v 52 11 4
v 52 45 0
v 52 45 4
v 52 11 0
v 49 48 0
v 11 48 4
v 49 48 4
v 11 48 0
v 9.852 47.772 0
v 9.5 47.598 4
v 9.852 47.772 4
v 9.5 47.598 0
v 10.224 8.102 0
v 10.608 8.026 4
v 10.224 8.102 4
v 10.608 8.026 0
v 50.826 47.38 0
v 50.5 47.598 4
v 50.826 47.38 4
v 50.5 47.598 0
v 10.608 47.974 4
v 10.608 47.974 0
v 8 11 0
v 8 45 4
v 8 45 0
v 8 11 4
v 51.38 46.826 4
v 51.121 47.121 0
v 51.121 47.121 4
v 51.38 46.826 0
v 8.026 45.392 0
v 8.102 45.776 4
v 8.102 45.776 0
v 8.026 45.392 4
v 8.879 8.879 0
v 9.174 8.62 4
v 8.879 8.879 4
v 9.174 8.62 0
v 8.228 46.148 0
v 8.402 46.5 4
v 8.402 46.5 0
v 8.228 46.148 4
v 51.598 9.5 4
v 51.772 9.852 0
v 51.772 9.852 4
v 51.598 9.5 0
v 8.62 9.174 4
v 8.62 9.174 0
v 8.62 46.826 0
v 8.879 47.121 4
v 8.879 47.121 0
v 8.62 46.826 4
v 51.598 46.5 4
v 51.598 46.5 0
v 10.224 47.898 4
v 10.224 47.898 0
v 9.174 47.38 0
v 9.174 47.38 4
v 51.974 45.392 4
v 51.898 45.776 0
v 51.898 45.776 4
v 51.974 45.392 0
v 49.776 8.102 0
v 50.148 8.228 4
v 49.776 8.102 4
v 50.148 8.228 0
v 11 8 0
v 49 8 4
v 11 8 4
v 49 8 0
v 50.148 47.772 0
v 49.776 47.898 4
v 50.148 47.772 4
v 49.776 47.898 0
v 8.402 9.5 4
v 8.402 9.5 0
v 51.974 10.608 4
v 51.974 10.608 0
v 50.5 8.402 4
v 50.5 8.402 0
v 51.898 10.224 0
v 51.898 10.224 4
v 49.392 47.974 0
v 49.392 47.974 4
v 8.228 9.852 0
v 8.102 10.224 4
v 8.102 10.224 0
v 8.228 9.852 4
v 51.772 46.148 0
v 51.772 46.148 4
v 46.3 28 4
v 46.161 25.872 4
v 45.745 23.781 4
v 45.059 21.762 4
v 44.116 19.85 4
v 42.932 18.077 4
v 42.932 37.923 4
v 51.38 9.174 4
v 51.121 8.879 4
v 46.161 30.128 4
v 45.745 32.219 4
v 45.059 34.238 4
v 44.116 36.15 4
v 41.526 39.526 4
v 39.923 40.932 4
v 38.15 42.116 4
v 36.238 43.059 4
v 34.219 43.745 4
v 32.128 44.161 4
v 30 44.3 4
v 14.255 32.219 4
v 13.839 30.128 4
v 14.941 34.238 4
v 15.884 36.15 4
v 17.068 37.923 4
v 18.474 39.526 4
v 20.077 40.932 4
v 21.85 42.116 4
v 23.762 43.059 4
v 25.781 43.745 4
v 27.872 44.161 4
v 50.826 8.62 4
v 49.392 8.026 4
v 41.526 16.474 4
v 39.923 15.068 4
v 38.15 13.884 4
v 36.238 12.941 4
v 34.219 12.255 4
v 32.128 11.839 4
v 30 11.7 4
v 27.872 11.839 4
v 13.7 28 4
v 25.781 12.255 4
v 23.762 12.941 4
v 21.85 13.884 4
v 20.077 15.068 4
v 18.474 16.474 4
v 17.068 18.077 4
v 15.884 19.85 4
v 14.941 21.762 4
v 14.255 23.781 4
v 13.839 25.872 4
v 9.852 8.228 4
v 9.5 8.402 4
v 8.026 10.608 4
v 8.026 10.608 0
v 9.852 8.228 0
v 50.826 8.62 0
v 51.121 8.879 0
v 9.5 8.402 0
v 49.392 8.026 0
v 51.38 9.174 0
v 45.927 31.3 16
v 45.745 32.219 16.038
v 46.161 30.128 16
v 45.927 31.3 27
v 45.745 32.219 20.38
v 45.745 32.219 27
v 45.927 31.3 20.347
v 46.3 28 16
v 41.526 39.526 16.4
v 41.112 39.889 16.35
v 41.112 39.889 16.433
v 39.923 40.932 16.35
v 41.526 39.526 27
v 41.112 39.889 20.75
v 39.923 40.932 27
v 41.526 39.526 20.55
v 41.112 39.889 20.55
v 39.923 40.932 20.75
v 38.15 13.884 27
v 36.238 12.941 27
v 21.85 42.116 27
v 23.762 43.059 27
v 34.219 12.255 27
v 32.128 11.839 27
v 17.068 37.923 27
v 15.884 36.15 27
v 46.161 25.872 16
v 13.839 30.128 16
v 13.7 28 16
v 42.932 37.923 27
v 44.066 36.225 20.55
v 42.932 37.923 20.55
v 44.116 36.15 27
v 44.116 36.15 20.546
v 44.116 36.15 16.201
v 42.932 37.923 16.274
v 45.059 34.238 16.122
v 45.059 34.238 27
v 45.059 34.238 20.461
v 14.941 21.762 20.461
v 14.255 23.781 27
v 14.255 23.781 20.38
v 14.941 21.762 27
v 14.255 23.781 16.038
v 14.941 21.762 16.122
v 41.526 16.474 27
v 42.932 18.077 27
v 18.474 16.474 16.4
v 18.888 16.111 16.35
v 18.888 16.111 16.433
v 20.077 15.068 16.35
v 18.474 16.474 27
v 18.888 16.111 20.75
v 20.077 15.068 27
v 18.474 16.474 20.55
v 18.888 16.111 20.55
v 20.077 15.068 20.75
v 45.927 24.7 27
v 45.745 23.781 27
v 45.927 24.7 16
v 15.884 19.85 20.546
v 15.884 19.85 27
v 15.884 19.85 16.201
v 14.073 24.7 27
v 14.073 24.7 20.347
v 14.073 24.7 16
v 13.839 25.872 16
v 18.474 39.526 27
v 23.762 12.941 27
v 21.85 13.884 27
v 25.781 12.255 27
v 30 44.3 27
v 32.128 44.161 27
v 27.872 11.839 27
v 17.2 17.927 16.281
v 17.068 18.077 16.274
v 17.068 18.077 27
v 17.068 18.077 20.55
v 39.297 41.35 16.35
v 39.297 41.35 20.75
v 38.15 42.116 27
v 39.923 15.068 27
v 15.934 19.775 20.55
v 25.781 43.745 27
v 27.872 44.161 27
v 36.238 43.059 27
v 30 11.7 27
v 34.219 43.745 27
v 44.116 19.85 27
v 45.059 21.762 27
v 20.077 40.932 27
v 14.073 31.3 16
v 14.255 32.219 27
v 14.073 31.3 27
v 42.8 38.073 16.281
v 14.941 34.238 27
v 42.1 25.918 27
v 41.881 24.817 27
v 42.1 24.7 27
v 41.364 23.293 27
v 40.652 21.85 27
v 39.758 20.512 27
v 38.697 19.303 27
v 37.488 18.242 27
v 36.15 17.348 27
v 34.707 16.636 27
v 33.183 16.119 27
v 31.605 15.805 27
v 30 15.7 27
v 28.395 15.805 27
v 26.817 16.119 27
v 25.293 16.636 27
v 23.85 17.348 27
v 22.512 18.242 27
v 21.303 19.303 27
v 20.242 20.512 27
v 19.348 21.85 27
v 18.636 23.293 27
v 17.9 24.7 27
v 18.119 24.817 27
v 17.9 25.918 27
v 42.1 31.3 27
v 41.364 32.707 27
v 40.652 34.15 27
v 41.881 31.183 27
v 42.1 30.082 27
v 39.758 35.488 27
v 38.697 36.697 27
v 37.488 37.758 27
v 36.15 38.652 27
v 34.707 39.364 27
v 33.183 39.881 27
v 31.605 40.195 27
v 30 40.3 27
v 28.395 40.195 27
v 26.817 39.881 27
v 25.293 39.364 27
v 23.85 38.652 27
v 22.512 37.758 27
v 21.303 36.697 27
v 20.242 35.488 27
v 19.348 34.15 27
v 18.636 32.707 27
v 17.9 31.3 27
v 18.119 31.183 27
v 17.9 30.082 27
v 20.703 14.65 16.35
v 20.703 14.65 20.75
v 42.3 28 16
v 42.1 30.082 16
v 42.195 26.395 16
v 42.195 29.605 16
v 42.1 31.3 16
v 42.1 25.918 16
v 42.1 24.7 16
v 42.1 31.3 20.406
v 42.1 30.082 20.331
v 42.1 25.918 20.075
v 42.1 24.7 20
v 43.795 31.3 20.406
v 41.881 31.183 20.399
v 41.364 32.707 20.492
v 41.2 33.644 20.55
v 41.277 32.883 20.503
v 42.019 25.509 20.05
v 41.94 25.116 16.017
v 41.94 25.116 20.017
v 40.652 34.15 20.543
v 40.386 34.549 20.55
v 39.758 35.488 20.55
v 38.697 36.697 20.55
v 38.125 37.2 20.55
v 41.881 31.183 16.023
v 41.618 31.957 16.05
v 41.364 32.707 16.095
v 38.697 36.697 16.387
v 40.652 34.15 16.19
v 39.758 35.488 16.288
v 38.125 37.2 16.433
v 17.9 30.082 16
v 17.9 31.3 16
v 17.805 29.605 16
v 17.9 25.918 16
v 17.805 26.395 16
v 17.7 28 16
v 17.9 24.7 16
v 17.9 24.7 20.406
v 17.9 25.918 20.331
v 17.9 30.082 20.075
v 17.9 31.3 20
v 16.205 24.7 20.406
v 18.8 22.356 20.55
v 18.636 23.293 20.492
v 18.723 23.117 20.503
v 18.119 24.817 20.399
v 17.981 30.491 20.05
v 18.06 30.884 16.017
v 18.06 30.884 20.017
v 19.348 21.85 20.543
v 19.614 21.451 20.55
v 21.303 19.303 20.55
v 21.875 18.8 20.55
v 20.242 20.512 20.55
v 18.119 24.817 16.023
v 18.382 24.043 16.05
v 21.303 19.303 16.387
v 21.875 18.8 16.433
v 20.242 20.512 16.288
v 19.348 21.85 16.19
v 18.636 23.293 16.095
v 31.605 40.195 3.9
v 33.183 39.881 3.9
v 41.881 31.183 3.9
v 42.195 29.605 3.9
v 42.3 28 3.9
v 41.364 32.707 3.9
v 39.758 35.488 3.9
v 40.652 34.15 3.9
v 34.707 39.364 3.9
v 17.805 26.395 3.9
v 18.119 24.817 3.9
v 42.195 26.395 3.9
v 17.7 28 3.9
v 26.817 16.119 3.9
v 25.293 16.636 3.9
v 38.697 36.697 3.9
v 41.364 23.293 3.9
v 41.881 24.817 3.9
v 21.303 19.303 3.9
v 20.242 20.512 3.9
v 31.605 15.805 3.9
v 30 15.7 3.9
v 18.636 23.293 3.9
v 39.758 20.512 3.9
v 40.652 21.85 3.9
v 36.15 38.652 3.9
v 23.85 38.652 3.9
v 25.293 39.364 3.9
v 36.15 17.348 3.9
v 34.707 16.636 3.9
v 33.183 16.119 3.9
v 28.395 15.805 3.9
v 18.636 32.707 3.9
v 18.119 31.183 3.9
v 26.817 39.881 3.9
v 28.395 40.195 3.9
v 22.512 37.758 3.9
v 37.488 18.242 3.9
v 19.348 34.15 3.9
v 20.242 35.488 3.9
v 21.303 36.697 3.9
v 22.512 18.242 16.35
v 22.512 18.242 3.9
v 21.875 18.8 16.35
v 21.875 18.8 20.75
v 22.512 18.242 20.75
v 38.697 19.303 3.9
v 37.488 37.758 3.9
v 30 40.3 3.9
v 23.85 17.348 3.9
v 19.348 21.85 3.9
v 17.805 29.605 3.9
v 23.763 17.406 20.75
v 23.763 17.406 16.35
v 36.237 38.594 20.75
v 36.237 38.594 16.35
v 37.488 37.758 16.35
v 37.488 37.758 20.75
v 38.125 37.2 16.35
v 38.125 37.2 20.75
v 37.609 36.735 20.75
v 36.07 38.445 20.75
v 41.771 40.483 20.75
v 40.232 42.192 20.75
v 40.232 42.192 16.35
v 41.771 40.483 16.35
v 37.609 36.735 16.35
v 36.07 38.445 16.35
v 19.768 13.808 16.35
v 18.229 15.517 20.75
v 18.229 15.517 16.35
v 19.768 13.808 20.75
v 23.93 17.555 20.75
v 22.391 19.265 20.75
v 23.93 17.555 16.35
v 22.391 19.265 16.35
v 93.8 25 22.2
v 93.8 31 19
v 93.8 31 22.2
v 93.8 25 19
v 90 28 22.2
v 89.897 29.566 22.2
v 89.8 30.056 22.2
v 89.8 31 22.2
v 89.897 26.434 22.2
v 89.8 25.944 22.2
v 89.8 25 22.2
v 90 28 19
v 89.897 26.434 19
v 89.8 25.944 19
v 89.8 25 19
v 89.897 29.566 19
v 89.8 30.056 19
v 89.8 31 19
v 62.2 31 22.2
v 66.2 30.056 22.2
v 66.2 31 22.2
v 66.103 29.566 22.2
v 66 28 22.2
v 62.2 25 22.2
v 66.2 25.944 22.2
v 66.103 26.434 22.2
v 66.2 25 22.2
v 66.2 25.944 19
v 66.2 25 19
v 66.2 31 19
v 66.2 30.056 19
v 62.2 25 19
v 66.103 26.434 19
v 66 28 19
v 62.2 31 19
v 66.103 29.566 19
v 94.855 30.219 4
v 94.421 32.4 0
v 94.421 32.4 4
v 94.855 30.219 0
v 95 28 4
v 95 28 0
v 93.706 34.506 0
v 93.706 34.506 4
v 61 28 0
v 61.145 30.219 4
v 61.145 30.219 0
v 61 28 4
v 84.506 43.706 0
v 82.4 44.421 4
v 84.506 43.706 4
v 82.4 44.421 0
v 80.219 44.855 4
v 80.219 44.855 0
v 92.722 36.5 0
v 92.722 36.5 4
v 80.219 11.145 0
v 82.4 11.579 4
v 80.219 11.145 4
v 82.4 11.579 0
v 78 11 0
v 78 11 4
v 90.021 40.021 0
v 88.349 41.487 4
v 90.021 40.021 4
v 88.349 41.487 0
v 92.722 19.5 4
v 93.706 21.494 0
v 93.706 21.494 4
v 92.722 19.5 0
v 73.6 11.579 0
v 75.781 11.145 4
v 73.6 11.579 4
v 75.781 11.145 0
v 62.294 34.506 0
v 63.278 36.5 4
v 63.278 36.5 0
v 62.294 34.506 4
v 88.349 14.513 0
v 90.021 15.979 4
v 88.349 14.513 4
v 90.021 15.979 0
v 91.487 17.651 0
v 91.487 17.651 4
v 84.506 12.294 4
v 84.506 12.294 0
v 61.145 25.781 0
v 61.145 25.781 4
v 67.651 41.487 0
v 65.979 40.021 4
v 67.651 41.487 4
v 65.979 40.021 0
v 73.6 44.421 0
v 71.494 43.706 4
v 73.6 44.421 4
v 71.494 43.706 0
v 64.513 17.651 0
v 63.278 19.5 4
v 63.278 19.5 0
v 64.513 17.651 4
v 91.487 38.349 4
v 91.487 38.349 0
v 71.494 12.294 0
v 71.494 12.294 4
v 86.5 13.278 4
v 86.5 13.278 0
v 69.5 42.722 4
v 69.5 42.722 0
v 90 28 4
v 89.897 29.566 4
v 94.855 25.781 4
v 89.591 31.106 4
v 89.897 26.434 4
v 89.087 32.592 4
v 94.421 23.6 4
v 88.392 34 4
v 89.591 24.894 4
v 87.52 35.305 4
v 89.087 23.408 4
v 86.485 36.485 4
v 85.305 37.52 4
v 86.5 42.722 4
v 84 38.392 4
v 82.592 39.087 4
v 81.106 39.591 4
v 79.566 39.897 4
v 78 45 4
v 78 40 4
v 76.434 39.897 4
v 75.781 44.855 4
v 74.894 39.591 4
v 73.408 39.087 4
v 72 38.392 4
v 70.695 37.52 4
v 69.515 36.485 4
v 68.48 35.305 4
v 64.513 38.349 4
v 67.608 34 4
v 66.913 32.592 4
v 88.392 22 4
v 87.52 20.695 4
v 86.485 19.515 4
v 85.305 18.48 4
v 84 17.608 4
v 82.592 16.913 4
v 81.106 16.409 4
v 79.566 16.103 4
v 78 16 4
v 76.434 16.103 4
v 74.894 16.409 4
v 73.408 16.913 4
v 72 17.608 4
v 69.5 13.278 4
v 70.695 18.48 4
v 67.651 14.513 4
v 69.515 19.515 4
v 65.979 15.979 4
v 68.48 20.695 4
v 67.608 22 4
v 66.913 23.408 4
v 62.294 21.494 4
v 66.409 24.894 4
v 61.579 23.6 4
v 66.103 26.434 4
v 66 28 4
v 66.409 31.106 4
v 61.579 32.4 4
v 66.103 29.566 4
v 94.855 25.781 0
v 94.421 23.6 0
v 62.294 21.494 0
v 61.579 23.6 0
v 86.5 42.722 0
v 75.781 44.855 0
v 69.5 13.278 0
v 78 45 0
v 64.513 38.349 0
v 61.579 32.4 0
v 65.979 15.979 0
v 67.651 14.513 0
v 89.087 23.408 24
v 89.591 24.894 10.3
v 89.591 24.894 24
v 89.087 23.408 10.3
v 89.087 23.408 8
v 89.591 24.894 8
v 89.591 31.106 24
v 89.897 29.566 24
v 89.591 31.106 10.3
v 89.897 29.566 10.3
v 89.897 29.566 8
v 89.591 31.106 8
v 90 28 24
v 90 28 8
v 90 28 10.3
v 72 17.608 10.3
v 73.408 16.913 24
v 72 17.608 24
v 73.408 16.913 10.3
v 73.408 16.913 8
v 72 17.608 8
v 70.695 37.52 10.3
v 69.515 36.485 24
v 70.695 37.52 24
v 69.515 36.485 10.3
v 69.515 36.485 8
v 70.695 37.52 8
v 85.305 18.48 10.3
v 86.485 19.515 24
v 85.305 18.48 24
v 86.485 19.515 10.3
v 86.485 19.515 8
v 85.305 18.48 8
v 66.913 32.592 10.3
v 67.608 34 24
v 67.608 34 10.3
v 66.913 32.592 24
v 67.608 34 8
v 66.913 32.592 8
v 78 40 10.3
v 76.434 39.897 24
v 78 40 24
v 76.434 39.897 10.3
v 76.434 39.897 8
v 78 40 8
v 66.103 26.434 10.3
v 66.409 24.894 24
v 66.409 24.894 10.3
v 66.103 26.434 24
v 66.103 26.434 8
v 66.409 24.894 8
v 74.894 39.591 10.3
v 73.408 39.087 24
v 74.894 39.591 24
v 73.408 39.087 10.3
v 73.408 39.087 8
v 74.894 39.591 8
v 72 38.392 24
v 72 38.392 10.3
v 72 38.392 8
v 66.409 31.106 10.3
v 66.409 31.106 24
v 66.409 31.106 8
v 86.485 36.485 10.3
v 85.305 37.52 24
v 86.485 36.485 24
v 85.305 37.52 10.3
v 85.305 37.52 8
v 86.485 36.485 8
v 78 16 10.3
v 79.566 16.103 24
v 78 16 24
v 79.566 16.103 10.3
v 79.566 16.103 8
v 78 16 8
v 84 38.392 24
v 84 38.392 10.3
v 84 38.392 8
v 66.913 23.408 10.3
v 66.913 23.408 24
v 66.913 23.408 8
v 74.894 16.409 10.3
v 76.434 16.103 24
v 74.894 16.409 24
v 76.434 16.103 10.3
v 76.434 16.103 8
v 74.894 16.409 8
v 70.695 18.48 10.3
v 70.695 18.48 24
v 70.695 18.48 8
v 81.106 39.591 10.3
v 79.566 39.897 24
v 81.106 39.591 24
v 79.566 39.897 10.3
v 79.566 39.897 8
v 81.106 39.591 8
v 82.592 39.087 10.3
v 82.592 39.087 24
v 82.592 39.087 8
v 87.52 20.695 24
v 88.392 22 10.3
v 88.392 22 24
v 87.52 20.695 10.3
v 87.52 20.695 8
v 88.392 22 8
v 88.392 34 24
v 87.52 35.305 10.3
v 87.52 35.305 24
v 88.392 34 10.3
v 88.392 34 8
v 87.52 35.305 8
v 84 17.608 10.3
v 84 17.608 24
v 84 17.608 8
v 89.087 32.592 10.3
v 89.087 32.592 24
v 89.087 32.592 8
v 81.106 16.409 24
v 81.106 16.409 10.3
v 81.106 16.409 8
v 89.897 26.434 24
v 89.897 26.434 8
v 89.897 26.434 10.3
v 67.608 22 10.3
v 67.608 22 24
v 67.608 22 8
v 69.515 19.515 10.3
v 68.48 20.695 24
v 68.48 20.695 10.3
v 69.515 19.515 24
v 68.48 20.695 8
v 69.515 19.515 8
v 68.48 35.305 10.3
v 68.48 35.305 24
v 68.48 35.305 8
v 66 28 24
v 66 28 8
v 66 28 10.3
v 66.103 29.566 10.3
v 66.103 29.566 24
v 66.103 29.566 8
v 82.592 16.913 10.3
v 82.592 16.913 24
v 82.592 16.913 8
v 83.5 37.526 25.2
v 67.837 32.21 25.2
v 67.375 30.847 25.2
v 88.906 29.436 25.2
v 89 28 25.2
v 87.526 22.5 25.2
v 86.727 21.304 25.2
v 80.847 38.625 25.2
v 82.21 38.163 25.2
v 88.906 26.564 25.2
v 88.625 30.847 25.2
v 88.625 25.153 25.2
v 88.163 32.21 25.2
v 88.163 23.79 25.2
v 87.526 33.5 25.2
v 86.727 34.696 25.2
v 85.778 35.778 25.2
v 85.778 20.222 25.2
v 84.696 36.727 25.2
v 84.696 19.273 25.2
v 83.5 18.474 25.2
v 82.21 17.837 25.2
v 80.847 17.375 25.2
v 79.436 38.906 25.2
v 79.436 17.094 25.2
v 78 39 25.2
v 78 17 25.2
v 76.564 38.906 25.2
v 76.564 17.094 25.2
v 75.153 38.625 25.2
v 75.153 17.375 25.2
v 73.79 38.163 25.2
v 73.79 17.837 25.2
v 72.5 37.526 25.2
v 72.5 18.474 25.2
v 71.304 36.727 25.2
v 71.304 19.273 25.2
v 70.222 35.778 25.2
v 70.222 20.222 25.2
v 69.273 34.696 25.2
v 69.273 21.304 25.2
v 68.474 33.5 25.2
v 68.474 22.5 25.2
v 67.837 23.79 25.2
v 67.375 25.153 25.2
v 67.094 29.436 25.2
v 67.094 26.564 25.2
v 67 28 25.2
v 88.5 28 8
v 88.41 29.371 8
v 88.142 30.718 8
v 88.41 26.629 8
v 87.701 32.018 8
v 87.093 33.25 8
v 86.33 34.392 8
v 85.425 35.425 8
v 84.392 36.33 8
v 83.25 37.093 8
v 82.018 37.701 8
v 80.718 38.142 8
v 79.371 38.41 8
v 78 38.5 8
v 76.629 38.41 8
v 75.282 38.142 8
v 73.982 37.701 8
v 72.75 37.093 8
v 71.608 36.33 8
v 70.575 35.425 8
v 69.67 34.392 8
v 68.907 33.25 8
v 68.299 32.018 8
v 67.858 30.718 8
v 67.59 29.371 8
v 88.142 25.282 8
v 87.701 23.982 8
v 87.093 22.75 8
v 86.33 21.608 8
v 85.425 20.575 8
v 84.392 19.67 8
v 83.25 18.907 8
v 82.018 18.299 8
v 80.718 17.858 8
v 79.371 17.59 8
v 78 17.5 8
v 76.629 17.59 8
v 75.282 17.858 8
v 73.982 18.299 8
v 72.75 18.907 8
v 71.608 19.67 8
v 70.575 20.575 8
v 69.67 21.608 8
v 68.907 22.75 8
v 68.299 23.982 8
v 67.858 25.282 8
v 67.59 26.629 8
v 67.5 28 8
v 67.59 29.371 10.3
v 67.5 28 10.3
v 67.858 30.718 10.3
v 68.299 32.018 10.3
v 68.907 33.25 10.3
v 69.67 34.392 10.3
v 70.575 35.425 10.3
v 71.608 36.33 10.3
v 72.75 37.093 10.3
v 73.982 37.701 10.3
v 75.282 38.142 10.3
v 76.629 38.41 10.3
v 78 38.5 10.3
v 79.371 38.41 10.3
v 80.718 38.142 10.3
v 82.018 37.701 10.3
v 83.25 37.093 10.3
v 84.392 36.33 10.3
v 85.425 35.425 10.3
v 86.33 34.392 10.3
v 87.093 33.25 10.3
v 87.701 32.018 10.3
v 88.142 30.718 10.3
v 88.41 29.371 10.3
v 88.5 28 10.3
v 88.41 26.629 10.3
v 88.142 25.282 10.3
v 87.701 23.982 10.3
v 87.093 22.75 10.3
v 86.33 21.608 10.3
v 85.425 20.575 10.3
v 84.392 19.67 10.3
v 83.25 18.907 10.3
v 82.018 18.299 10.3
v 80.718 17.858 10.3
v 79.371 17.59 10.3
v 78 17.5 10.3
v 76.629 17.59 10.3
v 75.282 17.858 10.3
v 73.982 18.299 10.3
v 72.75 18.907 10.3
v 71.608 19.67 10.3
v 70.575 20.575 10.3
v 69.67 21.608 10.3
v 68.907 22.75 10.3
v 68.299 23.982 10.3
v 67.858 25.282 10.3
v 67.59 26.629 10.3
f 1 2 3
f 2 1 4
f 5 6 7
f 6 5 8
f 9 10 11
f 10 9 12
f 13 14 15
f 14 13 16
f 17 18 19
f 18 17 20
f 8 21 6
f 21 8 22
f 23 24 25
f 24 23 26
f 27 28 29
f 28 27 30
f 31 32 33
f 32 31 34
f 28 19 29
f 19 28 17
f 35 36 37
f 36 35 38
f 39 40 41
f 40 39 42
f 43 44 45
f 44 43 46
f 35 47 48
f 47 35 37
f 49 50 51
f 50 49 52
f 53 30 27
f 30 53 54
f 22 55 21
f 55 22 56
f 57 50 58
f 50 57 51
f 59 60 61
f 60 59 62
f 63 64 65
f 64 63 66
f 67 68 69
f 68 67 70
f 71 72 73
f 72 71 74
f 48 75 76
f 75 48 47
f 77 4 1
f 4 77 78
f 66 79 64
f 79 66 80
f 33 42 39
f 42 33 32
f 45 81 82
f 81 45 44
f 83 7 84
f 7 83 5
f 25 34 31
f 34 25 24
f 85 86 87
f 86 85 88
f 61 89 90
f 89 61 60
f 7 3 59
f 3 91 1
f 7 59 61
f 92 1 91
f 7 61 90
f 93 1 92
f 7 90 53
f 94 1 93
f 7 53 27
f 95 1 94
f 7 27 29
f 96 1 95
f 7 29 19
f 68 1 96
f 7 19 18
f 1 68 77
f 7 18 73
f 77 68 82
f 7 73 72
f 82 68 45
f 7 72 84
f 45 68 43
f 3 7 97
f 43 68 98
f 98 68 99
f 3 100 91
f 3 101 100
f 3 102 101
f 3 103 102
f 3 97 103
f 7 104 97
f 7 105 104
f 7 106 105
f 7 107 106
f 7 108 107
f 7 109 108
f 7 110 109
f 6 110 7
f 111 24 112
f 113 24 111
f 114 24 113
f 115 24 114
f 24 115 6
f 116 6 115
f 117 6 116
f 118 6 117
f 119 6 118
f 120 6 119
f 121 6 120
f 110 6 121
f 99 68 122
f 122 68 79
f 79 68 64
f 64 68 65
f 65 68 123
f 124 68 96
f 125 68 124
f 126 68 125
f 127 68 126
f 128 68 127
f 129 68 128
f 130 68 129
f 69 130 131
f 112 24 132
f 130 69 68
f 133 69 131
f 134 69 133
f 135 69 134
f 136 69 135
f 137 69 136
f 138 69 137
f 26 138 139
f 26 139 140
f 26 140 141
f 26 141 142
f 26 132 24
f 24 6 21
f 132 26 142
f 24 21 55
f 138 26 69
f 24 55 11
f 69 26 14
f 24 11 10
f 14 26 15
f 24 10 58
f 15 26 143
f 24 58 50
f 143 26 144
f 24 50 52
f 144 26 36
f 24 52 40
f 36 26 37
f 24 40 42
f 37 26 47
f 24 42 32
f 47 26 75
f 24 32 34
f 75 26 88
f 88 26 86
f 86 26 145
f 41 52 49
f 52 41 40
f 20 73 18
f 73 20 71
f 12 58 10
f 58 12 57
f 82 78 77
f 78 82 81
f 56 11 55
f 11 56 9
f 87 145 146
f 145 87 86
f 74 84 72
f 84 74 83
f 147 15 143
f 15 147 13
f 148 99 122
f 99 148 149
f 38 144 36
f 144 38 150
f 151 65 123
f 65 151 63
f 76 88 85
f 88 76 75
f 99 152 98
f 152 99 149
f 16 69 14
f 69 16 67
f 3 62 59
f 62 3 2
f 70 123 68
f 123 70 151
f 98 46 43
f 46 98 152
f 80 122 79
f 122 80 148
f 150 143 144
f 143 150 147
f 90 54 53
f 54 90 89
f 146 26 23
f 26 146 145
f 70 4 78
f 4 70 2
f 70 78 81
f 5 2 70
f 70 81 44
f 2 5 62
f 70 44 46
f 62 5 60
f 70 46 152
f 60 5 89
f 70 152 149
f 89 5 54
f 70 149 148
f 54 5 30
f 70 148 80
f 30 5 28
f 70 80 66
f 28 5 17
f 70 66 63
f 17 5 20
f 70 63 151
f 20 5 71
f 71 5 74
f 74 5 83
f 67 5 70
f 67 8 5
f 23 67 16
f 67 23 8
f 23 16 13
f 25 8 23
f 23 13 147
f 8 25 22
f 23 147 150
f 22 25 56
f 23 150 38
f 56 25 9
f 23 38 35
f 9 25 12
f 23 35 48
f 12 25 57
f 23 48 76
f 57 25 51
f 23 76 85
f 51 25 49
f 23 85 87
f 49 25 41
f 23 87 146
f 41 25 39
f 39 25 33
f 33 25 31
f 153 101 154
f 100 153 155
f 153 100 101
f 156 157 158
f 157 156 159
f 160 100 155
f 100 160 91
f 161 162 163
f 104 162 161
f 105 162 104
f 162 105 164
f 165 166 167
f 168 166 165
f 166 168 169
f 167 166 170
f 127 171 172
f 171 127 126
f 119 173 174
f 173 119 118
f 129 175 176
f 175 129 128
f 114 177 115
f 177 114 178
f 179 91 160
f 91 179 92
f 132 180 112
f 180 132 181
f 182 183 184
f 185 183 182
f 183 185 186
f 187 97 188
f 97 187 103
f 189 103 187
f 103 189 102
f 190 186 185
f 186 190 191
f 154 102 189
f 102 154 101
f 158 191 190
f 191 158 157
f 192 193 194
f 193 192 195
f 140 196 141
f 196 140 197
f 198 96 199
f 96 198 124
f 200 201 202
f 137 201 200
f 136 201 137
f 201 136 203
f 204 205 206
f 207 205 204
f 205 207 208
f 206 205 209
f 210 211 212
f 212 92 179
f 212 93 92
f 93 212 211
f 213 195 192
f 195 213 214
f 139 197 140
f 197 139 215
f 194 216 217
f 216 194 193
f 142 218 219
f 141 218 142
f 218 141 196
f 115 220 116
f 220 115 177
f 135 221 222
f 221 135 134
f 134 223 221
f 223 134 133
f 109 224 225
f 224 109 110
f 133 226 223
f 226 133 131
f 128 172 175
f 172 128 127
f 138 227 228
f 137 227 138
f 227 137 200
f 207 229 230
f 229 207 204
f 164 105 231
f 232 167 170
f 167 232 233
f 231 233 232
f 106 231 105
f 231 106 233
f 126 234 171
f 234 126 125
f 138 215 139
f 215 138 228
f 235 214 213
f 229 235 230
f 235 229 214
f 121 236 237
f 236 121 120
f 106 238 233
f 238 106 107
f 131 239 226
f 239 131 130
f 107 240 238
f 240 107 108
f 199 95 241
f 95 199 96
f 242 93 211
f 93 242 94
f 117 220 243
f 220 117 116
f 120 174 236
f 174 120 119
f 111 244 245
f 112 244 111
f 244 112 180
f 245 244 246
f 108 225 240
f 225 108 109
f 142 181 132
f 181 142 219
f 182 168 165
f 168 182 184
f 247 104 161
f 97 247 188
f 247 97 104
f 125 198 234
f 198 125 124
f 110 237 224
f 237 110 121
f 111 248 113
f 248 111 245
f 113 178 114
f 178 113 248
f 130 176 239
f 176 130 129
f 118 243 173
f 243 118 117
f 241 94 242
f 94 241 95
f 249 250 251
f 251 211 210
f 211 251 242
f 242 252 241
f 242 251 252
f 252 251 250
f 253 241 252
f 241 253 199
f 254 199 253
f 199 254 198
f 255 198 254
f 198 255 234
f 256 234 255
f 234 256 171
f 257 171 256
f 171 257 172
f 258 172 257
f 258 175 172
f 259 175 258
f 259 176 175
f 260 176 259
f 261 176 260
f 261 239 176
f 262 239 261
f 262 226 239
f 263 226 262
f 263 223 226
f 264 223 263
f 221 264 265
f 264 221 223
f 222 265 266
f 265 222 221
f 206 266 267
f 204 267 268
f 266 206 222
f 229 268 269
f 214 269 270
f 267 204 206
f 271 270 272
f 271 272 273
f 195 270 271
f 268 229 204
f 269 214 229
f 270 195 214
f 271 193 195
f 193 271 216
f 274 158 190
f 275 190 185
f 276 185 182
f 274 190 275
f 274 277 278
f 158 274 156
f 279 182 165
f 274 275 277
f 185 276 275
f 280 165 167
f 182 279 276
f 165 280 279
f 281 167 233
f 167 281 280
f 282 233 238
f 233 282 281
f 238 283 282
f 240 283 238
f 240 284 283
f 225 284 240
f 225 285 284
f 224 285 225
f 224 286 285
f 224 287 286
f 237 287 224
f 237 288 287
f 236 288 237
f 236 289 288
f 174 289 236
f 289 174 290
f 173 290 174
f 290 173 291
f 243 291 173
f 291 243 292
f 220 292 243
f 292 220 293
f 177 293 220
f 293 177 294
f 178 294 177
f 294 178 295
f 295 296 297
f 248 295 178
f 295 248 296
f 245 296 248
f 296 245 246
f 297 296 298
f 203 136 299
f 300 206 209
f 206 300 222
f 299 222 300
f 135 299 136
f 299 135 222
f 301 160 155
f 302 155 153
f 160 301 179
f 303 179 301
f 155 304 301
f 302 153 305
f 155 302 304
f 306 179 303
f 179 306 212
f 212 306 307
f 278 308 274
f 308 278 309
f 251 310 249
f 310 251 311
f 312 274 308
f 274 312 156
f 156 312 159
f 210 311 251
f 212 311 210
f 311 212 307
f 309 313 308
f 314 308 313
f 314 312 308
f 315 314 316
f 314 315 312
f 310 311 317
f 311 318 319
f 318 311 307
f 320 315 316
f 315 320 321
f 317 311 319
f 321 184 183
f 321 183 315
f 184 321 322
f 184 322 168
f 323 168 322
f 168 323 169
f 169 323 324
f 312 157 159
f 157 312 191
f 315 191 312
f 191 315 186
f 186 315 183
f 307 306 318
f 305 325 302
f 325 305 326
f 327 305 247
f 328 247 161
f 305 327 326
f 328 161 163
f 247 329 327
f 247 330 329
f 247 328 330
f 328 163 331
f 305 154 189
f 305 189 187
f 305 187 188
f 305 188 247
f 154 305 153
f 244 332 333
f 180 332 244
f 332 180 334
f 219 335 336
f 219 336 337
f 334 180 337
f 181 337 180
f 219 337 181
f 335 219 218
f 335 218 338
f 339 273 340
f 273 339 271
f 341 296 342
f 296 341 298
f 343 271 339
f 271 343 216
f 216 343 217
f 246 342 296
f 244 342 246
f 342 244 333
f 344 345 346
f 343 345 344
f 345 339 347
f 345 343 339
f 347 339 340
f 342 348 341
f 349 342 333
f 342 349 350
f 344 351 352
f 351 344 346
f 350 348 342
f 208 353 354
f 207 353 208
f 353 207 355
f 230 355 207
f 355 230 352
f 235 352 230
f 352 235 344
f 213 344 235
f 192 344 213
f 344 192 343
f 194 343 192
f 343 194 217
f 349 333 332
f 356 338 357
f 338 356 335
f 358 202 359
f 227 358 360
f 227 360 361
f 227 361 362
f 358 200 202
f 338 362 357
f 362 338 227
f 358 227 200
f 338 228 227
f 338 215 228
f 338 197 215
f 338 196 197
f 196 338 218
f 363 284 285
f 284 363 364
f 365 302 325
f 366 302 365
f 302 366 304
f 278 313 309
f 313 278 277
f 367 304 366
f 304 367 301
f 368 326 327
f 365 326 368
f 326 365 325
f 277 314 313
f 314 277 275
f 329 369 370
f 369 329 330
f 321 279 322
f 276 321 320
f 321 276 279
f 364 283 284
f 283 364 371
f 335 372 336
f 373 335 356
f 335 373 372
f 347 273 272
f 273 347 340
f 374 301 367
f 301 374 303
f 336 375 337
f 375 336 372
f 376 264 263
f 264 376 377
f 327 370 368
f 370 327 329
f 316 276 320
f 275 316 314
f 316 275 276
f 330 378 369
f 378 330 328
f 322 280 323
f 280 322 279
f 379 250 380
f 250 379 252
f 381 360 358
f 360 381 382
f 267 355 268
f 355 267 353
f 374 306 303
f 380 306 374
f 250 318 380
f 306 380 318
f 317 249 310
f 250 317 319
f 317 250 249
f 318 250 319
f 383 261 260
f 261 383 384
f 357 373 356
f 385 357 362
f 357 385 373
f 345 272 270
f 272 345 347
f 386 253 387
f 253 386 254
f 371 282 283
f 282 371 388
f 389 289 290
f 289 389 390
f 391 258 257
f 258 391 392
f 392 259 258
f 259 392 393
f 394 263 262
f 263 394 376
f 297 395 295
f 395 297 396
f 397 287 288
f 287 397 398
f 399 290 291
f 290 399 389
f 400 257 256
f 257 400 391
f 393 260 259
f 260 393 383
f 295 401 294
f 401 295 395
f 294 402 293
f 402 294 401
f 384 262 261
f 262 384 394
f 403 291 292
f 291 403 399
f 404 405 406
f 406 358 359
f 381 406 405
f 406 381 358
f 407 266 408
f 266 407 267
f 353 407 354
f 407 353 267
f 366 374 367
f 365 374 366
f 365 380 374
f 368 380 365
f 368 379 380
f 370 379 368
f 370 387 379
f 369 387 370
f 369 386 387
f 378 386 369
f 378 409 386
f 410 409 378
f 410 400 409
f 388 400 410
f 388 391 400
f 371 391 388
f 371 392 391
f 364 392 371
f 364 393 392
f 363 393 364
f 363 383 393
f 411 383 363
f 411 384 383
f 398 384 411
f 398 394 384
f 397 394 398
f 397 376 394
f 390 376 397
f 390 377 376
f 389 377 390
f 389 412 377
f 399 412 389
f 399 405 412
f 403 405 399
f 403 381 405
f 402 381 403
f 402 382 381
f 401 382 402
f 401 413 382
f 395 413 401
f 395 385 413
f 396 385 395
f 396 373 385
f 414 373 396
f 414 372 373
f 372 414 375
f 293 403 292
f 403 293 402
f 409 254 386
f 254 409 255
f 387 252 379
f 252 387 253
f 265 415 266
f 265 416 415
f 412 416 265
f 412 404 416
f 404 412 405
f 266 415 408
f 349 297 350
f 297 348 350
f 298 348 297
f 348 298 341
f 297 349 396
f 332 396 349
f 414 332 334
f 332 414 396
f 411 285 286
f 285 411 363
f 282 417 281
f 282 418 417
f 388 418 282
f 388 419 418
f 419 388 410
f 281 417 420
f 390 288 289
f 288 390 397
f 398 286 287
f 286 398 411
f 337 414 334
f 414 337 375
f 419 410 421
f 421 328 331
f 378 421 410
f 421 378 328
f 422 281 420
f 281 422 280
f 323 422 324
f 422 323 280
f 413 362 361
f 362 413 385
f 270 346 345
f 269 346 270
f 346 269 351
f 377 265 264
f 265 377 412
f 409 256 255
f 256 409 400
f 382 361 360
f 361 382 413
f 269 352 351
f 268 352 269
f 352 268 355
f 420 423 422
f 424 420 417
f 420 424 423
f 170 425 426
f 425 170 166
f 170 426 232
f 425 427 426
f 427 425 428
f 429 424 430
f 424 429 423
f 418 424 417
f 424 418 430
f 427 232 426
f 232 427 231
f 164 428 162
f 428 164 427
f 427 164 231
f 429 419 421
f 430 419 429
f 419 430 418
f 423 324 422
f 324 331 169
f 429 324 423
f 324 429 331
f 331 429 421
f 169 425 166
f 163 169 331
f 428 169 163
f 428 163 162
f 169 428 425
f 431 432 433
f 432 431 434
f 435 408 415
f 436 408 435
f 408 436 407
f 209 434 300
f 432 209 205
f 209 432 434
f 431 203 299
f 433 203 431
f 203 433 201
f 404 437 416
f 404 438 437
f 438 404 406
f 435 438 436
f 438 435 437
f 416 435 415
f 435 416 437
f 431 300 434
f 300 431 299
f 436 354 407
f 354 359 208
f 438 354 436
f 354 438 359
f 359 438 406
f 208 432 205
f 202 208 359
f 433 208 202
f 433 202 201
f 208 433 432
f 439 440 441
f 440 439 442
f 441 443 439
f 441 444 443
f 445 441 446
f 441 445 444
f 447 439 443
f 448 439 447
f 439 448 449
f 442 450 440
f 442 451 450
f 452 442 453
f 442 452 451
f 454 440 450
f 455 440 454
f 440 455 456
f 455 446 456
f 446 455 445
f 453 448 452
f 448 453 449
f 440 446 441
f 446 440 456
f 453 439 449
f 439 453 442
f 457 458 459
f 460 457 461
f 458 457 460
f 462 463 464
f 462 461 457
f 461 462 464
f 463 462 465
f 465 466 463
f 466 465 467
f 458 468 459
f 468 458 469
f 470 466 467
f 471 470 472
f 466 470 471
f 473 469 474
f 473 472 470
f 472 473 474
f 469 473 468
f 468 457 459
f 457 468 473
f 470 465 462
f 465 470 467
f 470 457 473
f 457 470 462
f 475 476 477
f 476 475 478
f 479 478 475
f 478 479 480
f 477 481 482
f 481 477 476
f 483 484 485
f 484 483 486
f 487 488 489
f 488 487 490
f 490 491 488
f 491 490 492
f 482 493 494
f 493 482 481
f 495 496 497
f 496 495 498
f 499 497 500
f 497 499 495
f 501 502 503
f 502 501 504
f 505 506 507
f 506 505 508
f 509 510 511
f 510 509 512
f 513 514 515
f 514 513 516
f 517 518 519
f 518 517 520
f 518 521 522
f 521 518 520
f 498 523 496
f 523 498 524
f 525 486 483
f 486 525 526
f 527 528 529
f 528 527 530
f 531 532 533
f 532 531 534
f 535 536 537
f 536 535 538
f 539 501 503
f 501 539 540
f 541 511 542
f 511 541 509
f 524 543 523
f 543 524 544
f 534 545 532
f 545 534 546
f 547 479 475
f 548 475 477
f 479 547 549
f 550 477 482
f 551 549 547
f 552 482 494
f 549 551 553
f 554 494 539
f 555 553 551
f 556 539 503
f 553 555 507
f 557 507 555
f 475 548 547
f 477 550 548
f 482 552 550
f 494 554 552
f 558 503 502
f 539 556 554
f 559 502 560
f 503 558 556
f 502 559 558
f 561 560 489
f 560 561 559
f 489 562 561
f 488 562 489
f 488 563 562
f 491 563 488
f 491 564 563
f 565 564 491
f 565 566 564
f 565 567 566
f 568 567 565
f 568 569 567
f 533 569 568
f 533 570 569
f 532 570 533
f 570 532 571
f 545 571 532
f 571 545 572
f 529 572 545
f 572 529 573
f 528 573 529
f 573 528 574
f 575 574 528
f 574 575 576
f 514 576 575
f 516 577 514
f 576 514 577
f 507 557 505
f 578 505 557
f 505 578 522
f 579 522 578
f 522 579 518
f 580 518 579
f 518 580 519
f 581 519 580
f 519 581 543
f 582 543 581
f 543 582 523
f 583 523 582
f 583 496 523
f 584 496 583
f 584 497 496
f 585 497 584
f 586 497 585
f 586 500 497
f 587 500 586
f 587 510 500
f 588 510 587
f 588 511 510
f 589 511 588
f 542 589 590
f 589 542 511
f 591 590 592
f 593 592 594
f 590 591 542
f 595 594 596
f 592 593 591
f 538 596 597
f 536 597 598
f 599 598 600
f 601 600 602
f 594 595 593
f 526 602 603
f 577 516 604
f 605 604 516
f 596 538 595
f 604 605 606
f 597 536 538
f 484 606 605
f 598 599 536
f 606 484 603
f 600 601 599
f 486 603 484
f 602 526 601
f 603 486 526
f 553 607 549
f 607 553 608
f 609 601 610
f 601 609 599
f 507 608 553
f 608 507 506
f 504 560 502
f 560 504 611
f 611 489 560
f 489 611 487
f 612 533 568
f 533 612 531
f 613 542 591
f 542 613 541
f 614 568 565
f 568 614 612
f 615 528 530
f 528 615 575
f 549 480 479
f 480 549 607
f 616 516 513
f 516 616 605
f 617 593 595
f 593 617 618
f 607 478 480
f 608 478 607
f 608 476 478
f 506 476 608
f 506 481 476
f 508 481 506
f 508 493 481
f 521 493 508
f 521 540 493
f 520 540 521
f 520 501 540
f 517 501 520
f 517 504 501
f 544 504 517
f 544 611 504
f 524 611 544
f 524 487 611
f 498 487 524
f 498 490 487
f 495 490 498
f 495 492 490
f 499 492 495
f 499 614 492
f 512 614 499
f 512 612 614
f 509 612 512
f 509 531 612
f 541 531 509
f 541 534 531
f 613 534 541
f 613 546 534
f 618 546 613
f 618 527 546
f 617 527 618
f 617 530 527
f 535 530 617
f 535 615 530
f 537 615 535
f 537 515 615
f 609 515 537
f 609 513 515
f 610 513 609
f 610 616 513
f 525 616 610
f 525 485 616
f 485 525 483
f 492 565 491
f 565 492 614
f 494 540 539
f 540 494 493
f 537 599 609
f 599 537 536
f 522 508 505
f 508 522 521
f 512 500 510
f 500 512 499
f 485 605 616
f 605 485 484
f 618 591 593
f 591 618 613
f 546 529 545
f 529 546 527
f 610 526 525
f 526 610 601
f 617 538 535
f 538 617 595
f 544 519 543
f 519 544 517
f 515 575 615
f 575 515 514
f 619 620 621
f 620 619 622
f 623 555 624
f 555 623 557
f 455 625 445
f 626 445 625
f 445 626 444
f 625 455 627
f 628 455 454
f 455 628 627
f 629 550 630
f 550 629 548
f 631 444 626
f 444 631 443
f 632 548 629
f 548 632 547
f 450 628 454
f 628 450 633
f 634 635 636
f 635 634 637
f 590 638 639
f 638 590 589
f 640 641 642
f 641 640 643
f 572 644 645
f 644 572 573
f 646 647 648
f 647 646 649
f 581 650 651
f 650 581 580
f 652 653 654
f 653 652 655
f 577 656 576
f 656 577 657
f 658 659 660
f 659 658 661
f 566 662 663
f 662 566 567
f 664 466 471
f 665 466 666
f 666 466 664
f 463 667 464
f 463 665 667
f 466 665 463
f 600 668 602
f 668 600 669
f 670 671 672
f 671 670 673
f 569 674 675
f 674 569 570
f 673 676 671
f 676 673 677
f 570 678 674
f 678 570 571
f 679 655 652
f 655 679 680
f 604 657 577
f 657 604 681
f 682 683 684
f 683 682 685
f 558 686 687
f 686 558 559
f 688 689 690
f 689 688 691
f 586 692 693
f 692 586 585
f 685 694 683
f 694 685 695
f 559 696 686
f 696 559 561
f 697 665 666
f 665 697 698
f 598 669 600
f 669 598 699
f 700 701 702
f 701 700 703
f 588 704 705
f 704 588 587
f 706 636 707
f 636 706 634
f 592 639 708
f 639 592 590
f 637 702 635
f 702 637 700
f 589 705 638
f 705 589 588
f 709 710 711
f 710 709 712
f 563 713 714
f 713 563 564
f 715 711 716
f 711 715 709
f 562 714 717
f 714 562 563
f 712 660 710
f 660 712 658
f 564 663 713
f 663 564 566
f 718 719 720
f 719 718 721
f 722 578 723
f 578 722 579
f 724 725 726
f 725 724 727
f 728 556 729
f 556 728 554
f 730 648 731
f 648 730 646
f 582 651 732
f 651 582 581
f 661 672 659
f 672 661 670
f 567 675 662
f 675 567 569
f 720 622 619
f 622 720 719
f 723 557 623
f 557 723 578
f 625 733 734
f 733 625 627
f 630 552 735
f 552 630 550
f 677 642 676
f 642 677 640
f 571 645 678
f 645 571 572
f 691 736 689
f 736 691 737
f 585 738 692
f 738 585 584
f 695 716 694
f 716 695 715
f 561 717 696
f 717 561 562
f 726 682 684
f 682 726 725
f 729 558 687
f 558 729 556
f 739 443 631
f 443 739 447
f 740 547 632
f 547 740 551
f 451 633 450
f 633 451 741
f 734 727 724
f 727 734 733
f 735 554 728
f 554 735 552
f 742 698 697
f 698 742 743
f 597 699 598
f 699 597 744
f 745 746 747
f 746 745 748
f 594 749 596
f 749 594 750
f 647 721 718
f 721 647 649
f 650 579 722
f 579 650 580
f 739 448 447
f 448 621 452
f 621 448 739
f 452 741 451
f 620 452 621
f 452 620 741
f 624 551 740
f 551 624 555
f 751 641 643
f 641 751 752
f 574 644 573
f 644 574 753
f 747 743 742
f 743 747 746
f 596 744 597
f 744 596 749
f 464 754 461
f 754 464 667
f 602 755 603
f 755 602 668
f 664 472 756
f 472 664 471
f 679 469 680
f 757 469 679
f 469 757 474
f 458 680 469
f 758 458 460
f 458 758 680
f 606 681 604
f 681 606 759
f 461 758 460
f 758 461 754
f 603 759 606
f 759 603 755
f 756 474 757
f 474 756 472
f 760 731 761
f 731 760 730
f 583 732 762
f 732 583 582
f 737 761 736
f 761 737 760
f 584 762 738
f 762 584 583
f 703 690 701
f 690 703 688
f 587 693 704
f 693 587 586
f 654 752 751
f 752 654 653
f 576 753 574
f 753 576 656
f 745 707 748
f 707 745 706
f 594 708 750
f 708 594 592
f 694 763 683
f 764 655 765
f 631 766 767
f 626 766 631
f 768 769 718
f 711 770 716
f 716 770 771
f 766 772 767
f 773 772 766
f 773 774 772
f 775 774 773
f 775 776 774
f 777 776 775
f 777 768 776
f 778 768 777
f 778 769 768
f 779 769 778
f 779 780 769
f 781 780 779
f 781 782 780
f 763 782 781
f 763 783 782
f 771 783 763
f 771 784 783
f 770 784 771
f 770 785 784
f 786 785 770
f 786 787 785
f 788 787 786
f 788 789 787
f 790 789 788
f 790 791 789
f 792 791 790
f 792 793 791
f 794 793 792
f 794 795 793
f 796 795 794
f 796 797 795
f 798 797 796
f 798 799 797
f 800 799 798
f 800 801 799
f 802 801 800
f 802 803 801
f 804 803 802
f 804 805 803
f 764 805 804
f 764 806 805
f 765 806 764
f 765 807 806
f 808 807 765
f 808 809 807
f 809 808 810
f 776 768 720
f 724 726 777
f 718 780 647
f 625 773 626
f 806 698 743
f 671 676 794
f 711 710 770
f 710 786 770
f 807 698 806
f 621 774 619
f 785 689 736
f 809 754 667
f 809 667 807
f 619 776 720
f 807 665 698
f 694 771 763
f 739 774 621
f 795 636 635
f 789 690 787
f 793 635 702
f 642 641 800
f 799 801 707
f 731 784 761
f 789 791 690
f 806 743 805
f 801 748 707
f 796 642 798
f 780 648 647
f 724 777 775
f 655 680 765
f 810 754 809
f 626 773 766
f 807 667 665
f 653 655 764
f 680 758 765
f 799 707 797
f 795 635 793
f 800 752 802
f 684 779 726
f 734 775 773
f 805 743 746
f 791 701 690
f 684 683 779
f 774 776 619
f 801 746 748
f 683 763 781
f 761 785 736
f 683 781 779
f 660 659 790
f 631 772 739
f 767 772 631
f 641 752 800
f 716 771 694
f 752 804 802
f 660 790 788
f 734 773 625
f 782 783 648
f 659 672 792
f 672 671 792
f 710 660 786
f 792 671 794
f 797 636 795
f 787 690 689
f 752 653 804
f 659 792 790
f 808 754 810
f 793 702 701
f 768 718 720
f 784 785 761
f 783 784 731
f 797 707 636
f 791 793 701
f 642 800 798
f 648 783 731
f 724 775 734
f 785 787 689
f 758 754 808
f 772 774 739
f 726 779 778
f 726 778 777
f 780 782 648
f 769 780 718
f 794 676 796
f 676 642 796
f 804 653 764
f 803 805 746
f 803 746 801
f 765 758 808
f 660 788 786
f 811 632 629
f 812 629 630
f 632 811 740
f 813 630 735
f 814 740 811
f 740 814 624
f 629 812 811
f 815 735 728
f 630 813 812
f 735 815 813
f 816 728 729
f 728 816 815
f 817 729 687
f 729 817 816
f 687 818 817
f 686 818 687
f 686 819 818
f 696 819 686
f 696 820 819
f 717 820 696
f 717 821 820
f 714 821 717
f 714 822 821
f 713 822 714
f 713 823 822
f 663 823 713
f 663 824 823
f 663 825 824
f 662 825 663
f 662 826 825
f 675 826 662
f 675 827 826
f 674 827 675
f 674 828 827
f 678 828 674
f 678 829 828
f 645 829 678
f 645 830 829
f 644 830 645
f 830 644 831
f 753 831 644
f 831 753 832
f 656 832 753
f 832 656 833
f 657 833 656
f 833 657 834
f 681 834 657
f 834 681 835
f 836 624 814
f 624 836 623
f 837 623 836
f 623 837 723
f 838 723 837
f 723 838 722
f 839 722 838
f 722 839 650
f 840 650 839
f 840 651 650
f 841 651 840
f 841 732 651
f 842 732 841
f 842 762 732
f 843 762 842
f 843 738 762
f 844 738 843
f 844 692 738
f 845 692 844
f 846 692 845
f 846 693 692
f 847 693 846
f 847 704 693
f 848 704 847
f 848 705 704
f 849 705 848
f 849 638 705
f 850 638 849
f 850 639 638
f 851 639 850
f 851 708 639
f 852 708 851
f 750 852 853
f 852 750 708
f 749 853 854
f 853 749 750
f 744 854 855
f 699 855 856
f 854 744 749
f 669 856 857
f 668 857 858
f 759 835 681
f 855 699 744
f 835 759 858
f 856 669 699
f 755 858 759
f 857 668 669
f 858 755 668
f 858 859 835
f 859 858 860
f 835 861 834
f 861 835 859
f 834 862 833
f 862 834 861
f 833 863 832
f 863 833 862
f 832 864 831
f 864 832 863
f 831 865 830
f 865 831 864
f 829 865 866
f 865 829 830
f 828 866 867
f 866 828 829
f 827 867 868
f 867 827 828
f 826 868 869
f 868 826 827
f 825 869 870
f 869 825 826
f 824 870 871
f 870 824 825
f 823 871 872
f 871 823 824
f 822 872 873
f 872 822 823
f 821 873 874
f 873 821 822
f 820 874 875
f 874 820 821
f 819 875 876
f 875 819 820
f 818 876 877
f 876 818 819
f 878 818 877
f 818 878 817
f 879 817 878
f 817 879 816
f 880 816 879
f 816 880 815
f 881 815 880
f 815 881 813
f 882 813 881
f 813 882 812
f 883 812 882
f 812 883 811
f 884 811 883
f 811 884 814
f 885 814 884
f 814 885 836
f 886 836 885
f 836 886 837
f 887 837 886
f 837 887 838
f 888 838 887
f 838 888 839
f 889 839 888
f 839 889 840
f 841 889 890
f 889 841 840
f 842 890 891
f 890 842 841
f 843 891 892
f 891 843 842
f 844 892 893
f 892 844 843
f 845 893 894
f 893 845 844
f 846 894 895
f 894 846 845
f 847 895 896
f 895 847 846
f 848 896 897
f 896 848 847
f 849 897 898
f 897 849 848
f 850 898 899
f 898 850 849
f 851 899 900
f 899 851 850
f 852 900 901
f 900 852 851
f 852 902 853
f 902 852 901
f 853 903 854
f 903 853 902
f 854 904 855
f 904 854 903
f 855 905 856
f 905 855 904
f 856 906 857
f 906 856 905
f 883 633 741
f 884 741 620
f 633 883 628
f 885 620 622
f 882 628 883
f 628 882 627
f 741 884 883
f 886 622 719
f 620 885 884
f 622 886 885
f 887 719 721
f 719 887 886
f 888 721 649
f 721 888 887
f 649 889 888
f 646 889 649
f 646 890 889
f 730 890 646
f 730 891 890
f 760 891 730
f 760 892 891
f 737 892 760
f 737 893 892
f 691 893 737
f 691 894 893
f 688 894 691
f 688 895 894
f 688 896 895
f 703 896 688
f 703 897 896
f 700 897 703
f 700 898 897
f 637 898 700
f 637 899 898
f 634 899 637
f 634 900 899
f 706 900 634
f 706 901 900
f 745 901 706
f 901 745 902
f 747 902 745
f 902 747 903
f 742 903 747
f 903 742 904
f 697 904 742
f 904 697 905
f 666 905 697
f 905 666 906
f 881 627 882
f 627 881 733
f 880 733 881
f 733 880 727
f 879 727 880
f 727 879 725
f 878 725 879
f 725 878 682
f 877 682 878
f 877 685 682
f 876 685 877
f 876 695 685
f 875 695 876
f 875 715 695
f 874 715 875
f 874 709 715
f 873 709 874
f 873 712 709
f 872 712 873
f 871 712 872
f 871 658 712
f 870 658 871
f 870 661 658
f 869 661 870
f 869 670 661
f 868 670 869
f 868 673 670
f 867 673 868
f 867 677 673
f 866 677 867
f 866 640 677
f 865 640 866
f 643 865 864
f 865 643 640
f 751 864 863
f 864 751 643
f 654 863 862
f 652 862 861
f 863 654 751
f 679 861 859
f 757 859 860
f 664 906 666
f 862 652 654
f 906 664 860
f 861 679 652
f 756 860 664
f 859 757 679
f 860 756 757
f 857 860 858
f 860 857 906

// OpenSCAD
/*
Sample 125: O-Ring-vorgespanntes Rampenbajonett — 10 % radiale Kompression
Generated from the FDM Mechanical Sample Library.
Units: millimetres.

Override examples:
  openscad -o custom.stl -D 'view="plate"' -D 'render_fn=64' model.scad
  openscad -o preview.png -D 'view="assembly"' model.scad
*/
use <../../../library/fdm_mechanisms.scad>

render_fn = is_undef(render_fn) ? 48 : render_fn;
view = is_undef(view) ? "plate" : view;
$fn = render_fn;

sample_ramped_bayonet(
    view=view,
    core_d=24,
    running_clearance=0.3,
    lug_w=6,
    ramp_h=0.55,
    turn_deg=42,
    oring_id=21,
    oring_cs=2,
    radial_squeeze=0.1,
    hard_stop=1.5
);
